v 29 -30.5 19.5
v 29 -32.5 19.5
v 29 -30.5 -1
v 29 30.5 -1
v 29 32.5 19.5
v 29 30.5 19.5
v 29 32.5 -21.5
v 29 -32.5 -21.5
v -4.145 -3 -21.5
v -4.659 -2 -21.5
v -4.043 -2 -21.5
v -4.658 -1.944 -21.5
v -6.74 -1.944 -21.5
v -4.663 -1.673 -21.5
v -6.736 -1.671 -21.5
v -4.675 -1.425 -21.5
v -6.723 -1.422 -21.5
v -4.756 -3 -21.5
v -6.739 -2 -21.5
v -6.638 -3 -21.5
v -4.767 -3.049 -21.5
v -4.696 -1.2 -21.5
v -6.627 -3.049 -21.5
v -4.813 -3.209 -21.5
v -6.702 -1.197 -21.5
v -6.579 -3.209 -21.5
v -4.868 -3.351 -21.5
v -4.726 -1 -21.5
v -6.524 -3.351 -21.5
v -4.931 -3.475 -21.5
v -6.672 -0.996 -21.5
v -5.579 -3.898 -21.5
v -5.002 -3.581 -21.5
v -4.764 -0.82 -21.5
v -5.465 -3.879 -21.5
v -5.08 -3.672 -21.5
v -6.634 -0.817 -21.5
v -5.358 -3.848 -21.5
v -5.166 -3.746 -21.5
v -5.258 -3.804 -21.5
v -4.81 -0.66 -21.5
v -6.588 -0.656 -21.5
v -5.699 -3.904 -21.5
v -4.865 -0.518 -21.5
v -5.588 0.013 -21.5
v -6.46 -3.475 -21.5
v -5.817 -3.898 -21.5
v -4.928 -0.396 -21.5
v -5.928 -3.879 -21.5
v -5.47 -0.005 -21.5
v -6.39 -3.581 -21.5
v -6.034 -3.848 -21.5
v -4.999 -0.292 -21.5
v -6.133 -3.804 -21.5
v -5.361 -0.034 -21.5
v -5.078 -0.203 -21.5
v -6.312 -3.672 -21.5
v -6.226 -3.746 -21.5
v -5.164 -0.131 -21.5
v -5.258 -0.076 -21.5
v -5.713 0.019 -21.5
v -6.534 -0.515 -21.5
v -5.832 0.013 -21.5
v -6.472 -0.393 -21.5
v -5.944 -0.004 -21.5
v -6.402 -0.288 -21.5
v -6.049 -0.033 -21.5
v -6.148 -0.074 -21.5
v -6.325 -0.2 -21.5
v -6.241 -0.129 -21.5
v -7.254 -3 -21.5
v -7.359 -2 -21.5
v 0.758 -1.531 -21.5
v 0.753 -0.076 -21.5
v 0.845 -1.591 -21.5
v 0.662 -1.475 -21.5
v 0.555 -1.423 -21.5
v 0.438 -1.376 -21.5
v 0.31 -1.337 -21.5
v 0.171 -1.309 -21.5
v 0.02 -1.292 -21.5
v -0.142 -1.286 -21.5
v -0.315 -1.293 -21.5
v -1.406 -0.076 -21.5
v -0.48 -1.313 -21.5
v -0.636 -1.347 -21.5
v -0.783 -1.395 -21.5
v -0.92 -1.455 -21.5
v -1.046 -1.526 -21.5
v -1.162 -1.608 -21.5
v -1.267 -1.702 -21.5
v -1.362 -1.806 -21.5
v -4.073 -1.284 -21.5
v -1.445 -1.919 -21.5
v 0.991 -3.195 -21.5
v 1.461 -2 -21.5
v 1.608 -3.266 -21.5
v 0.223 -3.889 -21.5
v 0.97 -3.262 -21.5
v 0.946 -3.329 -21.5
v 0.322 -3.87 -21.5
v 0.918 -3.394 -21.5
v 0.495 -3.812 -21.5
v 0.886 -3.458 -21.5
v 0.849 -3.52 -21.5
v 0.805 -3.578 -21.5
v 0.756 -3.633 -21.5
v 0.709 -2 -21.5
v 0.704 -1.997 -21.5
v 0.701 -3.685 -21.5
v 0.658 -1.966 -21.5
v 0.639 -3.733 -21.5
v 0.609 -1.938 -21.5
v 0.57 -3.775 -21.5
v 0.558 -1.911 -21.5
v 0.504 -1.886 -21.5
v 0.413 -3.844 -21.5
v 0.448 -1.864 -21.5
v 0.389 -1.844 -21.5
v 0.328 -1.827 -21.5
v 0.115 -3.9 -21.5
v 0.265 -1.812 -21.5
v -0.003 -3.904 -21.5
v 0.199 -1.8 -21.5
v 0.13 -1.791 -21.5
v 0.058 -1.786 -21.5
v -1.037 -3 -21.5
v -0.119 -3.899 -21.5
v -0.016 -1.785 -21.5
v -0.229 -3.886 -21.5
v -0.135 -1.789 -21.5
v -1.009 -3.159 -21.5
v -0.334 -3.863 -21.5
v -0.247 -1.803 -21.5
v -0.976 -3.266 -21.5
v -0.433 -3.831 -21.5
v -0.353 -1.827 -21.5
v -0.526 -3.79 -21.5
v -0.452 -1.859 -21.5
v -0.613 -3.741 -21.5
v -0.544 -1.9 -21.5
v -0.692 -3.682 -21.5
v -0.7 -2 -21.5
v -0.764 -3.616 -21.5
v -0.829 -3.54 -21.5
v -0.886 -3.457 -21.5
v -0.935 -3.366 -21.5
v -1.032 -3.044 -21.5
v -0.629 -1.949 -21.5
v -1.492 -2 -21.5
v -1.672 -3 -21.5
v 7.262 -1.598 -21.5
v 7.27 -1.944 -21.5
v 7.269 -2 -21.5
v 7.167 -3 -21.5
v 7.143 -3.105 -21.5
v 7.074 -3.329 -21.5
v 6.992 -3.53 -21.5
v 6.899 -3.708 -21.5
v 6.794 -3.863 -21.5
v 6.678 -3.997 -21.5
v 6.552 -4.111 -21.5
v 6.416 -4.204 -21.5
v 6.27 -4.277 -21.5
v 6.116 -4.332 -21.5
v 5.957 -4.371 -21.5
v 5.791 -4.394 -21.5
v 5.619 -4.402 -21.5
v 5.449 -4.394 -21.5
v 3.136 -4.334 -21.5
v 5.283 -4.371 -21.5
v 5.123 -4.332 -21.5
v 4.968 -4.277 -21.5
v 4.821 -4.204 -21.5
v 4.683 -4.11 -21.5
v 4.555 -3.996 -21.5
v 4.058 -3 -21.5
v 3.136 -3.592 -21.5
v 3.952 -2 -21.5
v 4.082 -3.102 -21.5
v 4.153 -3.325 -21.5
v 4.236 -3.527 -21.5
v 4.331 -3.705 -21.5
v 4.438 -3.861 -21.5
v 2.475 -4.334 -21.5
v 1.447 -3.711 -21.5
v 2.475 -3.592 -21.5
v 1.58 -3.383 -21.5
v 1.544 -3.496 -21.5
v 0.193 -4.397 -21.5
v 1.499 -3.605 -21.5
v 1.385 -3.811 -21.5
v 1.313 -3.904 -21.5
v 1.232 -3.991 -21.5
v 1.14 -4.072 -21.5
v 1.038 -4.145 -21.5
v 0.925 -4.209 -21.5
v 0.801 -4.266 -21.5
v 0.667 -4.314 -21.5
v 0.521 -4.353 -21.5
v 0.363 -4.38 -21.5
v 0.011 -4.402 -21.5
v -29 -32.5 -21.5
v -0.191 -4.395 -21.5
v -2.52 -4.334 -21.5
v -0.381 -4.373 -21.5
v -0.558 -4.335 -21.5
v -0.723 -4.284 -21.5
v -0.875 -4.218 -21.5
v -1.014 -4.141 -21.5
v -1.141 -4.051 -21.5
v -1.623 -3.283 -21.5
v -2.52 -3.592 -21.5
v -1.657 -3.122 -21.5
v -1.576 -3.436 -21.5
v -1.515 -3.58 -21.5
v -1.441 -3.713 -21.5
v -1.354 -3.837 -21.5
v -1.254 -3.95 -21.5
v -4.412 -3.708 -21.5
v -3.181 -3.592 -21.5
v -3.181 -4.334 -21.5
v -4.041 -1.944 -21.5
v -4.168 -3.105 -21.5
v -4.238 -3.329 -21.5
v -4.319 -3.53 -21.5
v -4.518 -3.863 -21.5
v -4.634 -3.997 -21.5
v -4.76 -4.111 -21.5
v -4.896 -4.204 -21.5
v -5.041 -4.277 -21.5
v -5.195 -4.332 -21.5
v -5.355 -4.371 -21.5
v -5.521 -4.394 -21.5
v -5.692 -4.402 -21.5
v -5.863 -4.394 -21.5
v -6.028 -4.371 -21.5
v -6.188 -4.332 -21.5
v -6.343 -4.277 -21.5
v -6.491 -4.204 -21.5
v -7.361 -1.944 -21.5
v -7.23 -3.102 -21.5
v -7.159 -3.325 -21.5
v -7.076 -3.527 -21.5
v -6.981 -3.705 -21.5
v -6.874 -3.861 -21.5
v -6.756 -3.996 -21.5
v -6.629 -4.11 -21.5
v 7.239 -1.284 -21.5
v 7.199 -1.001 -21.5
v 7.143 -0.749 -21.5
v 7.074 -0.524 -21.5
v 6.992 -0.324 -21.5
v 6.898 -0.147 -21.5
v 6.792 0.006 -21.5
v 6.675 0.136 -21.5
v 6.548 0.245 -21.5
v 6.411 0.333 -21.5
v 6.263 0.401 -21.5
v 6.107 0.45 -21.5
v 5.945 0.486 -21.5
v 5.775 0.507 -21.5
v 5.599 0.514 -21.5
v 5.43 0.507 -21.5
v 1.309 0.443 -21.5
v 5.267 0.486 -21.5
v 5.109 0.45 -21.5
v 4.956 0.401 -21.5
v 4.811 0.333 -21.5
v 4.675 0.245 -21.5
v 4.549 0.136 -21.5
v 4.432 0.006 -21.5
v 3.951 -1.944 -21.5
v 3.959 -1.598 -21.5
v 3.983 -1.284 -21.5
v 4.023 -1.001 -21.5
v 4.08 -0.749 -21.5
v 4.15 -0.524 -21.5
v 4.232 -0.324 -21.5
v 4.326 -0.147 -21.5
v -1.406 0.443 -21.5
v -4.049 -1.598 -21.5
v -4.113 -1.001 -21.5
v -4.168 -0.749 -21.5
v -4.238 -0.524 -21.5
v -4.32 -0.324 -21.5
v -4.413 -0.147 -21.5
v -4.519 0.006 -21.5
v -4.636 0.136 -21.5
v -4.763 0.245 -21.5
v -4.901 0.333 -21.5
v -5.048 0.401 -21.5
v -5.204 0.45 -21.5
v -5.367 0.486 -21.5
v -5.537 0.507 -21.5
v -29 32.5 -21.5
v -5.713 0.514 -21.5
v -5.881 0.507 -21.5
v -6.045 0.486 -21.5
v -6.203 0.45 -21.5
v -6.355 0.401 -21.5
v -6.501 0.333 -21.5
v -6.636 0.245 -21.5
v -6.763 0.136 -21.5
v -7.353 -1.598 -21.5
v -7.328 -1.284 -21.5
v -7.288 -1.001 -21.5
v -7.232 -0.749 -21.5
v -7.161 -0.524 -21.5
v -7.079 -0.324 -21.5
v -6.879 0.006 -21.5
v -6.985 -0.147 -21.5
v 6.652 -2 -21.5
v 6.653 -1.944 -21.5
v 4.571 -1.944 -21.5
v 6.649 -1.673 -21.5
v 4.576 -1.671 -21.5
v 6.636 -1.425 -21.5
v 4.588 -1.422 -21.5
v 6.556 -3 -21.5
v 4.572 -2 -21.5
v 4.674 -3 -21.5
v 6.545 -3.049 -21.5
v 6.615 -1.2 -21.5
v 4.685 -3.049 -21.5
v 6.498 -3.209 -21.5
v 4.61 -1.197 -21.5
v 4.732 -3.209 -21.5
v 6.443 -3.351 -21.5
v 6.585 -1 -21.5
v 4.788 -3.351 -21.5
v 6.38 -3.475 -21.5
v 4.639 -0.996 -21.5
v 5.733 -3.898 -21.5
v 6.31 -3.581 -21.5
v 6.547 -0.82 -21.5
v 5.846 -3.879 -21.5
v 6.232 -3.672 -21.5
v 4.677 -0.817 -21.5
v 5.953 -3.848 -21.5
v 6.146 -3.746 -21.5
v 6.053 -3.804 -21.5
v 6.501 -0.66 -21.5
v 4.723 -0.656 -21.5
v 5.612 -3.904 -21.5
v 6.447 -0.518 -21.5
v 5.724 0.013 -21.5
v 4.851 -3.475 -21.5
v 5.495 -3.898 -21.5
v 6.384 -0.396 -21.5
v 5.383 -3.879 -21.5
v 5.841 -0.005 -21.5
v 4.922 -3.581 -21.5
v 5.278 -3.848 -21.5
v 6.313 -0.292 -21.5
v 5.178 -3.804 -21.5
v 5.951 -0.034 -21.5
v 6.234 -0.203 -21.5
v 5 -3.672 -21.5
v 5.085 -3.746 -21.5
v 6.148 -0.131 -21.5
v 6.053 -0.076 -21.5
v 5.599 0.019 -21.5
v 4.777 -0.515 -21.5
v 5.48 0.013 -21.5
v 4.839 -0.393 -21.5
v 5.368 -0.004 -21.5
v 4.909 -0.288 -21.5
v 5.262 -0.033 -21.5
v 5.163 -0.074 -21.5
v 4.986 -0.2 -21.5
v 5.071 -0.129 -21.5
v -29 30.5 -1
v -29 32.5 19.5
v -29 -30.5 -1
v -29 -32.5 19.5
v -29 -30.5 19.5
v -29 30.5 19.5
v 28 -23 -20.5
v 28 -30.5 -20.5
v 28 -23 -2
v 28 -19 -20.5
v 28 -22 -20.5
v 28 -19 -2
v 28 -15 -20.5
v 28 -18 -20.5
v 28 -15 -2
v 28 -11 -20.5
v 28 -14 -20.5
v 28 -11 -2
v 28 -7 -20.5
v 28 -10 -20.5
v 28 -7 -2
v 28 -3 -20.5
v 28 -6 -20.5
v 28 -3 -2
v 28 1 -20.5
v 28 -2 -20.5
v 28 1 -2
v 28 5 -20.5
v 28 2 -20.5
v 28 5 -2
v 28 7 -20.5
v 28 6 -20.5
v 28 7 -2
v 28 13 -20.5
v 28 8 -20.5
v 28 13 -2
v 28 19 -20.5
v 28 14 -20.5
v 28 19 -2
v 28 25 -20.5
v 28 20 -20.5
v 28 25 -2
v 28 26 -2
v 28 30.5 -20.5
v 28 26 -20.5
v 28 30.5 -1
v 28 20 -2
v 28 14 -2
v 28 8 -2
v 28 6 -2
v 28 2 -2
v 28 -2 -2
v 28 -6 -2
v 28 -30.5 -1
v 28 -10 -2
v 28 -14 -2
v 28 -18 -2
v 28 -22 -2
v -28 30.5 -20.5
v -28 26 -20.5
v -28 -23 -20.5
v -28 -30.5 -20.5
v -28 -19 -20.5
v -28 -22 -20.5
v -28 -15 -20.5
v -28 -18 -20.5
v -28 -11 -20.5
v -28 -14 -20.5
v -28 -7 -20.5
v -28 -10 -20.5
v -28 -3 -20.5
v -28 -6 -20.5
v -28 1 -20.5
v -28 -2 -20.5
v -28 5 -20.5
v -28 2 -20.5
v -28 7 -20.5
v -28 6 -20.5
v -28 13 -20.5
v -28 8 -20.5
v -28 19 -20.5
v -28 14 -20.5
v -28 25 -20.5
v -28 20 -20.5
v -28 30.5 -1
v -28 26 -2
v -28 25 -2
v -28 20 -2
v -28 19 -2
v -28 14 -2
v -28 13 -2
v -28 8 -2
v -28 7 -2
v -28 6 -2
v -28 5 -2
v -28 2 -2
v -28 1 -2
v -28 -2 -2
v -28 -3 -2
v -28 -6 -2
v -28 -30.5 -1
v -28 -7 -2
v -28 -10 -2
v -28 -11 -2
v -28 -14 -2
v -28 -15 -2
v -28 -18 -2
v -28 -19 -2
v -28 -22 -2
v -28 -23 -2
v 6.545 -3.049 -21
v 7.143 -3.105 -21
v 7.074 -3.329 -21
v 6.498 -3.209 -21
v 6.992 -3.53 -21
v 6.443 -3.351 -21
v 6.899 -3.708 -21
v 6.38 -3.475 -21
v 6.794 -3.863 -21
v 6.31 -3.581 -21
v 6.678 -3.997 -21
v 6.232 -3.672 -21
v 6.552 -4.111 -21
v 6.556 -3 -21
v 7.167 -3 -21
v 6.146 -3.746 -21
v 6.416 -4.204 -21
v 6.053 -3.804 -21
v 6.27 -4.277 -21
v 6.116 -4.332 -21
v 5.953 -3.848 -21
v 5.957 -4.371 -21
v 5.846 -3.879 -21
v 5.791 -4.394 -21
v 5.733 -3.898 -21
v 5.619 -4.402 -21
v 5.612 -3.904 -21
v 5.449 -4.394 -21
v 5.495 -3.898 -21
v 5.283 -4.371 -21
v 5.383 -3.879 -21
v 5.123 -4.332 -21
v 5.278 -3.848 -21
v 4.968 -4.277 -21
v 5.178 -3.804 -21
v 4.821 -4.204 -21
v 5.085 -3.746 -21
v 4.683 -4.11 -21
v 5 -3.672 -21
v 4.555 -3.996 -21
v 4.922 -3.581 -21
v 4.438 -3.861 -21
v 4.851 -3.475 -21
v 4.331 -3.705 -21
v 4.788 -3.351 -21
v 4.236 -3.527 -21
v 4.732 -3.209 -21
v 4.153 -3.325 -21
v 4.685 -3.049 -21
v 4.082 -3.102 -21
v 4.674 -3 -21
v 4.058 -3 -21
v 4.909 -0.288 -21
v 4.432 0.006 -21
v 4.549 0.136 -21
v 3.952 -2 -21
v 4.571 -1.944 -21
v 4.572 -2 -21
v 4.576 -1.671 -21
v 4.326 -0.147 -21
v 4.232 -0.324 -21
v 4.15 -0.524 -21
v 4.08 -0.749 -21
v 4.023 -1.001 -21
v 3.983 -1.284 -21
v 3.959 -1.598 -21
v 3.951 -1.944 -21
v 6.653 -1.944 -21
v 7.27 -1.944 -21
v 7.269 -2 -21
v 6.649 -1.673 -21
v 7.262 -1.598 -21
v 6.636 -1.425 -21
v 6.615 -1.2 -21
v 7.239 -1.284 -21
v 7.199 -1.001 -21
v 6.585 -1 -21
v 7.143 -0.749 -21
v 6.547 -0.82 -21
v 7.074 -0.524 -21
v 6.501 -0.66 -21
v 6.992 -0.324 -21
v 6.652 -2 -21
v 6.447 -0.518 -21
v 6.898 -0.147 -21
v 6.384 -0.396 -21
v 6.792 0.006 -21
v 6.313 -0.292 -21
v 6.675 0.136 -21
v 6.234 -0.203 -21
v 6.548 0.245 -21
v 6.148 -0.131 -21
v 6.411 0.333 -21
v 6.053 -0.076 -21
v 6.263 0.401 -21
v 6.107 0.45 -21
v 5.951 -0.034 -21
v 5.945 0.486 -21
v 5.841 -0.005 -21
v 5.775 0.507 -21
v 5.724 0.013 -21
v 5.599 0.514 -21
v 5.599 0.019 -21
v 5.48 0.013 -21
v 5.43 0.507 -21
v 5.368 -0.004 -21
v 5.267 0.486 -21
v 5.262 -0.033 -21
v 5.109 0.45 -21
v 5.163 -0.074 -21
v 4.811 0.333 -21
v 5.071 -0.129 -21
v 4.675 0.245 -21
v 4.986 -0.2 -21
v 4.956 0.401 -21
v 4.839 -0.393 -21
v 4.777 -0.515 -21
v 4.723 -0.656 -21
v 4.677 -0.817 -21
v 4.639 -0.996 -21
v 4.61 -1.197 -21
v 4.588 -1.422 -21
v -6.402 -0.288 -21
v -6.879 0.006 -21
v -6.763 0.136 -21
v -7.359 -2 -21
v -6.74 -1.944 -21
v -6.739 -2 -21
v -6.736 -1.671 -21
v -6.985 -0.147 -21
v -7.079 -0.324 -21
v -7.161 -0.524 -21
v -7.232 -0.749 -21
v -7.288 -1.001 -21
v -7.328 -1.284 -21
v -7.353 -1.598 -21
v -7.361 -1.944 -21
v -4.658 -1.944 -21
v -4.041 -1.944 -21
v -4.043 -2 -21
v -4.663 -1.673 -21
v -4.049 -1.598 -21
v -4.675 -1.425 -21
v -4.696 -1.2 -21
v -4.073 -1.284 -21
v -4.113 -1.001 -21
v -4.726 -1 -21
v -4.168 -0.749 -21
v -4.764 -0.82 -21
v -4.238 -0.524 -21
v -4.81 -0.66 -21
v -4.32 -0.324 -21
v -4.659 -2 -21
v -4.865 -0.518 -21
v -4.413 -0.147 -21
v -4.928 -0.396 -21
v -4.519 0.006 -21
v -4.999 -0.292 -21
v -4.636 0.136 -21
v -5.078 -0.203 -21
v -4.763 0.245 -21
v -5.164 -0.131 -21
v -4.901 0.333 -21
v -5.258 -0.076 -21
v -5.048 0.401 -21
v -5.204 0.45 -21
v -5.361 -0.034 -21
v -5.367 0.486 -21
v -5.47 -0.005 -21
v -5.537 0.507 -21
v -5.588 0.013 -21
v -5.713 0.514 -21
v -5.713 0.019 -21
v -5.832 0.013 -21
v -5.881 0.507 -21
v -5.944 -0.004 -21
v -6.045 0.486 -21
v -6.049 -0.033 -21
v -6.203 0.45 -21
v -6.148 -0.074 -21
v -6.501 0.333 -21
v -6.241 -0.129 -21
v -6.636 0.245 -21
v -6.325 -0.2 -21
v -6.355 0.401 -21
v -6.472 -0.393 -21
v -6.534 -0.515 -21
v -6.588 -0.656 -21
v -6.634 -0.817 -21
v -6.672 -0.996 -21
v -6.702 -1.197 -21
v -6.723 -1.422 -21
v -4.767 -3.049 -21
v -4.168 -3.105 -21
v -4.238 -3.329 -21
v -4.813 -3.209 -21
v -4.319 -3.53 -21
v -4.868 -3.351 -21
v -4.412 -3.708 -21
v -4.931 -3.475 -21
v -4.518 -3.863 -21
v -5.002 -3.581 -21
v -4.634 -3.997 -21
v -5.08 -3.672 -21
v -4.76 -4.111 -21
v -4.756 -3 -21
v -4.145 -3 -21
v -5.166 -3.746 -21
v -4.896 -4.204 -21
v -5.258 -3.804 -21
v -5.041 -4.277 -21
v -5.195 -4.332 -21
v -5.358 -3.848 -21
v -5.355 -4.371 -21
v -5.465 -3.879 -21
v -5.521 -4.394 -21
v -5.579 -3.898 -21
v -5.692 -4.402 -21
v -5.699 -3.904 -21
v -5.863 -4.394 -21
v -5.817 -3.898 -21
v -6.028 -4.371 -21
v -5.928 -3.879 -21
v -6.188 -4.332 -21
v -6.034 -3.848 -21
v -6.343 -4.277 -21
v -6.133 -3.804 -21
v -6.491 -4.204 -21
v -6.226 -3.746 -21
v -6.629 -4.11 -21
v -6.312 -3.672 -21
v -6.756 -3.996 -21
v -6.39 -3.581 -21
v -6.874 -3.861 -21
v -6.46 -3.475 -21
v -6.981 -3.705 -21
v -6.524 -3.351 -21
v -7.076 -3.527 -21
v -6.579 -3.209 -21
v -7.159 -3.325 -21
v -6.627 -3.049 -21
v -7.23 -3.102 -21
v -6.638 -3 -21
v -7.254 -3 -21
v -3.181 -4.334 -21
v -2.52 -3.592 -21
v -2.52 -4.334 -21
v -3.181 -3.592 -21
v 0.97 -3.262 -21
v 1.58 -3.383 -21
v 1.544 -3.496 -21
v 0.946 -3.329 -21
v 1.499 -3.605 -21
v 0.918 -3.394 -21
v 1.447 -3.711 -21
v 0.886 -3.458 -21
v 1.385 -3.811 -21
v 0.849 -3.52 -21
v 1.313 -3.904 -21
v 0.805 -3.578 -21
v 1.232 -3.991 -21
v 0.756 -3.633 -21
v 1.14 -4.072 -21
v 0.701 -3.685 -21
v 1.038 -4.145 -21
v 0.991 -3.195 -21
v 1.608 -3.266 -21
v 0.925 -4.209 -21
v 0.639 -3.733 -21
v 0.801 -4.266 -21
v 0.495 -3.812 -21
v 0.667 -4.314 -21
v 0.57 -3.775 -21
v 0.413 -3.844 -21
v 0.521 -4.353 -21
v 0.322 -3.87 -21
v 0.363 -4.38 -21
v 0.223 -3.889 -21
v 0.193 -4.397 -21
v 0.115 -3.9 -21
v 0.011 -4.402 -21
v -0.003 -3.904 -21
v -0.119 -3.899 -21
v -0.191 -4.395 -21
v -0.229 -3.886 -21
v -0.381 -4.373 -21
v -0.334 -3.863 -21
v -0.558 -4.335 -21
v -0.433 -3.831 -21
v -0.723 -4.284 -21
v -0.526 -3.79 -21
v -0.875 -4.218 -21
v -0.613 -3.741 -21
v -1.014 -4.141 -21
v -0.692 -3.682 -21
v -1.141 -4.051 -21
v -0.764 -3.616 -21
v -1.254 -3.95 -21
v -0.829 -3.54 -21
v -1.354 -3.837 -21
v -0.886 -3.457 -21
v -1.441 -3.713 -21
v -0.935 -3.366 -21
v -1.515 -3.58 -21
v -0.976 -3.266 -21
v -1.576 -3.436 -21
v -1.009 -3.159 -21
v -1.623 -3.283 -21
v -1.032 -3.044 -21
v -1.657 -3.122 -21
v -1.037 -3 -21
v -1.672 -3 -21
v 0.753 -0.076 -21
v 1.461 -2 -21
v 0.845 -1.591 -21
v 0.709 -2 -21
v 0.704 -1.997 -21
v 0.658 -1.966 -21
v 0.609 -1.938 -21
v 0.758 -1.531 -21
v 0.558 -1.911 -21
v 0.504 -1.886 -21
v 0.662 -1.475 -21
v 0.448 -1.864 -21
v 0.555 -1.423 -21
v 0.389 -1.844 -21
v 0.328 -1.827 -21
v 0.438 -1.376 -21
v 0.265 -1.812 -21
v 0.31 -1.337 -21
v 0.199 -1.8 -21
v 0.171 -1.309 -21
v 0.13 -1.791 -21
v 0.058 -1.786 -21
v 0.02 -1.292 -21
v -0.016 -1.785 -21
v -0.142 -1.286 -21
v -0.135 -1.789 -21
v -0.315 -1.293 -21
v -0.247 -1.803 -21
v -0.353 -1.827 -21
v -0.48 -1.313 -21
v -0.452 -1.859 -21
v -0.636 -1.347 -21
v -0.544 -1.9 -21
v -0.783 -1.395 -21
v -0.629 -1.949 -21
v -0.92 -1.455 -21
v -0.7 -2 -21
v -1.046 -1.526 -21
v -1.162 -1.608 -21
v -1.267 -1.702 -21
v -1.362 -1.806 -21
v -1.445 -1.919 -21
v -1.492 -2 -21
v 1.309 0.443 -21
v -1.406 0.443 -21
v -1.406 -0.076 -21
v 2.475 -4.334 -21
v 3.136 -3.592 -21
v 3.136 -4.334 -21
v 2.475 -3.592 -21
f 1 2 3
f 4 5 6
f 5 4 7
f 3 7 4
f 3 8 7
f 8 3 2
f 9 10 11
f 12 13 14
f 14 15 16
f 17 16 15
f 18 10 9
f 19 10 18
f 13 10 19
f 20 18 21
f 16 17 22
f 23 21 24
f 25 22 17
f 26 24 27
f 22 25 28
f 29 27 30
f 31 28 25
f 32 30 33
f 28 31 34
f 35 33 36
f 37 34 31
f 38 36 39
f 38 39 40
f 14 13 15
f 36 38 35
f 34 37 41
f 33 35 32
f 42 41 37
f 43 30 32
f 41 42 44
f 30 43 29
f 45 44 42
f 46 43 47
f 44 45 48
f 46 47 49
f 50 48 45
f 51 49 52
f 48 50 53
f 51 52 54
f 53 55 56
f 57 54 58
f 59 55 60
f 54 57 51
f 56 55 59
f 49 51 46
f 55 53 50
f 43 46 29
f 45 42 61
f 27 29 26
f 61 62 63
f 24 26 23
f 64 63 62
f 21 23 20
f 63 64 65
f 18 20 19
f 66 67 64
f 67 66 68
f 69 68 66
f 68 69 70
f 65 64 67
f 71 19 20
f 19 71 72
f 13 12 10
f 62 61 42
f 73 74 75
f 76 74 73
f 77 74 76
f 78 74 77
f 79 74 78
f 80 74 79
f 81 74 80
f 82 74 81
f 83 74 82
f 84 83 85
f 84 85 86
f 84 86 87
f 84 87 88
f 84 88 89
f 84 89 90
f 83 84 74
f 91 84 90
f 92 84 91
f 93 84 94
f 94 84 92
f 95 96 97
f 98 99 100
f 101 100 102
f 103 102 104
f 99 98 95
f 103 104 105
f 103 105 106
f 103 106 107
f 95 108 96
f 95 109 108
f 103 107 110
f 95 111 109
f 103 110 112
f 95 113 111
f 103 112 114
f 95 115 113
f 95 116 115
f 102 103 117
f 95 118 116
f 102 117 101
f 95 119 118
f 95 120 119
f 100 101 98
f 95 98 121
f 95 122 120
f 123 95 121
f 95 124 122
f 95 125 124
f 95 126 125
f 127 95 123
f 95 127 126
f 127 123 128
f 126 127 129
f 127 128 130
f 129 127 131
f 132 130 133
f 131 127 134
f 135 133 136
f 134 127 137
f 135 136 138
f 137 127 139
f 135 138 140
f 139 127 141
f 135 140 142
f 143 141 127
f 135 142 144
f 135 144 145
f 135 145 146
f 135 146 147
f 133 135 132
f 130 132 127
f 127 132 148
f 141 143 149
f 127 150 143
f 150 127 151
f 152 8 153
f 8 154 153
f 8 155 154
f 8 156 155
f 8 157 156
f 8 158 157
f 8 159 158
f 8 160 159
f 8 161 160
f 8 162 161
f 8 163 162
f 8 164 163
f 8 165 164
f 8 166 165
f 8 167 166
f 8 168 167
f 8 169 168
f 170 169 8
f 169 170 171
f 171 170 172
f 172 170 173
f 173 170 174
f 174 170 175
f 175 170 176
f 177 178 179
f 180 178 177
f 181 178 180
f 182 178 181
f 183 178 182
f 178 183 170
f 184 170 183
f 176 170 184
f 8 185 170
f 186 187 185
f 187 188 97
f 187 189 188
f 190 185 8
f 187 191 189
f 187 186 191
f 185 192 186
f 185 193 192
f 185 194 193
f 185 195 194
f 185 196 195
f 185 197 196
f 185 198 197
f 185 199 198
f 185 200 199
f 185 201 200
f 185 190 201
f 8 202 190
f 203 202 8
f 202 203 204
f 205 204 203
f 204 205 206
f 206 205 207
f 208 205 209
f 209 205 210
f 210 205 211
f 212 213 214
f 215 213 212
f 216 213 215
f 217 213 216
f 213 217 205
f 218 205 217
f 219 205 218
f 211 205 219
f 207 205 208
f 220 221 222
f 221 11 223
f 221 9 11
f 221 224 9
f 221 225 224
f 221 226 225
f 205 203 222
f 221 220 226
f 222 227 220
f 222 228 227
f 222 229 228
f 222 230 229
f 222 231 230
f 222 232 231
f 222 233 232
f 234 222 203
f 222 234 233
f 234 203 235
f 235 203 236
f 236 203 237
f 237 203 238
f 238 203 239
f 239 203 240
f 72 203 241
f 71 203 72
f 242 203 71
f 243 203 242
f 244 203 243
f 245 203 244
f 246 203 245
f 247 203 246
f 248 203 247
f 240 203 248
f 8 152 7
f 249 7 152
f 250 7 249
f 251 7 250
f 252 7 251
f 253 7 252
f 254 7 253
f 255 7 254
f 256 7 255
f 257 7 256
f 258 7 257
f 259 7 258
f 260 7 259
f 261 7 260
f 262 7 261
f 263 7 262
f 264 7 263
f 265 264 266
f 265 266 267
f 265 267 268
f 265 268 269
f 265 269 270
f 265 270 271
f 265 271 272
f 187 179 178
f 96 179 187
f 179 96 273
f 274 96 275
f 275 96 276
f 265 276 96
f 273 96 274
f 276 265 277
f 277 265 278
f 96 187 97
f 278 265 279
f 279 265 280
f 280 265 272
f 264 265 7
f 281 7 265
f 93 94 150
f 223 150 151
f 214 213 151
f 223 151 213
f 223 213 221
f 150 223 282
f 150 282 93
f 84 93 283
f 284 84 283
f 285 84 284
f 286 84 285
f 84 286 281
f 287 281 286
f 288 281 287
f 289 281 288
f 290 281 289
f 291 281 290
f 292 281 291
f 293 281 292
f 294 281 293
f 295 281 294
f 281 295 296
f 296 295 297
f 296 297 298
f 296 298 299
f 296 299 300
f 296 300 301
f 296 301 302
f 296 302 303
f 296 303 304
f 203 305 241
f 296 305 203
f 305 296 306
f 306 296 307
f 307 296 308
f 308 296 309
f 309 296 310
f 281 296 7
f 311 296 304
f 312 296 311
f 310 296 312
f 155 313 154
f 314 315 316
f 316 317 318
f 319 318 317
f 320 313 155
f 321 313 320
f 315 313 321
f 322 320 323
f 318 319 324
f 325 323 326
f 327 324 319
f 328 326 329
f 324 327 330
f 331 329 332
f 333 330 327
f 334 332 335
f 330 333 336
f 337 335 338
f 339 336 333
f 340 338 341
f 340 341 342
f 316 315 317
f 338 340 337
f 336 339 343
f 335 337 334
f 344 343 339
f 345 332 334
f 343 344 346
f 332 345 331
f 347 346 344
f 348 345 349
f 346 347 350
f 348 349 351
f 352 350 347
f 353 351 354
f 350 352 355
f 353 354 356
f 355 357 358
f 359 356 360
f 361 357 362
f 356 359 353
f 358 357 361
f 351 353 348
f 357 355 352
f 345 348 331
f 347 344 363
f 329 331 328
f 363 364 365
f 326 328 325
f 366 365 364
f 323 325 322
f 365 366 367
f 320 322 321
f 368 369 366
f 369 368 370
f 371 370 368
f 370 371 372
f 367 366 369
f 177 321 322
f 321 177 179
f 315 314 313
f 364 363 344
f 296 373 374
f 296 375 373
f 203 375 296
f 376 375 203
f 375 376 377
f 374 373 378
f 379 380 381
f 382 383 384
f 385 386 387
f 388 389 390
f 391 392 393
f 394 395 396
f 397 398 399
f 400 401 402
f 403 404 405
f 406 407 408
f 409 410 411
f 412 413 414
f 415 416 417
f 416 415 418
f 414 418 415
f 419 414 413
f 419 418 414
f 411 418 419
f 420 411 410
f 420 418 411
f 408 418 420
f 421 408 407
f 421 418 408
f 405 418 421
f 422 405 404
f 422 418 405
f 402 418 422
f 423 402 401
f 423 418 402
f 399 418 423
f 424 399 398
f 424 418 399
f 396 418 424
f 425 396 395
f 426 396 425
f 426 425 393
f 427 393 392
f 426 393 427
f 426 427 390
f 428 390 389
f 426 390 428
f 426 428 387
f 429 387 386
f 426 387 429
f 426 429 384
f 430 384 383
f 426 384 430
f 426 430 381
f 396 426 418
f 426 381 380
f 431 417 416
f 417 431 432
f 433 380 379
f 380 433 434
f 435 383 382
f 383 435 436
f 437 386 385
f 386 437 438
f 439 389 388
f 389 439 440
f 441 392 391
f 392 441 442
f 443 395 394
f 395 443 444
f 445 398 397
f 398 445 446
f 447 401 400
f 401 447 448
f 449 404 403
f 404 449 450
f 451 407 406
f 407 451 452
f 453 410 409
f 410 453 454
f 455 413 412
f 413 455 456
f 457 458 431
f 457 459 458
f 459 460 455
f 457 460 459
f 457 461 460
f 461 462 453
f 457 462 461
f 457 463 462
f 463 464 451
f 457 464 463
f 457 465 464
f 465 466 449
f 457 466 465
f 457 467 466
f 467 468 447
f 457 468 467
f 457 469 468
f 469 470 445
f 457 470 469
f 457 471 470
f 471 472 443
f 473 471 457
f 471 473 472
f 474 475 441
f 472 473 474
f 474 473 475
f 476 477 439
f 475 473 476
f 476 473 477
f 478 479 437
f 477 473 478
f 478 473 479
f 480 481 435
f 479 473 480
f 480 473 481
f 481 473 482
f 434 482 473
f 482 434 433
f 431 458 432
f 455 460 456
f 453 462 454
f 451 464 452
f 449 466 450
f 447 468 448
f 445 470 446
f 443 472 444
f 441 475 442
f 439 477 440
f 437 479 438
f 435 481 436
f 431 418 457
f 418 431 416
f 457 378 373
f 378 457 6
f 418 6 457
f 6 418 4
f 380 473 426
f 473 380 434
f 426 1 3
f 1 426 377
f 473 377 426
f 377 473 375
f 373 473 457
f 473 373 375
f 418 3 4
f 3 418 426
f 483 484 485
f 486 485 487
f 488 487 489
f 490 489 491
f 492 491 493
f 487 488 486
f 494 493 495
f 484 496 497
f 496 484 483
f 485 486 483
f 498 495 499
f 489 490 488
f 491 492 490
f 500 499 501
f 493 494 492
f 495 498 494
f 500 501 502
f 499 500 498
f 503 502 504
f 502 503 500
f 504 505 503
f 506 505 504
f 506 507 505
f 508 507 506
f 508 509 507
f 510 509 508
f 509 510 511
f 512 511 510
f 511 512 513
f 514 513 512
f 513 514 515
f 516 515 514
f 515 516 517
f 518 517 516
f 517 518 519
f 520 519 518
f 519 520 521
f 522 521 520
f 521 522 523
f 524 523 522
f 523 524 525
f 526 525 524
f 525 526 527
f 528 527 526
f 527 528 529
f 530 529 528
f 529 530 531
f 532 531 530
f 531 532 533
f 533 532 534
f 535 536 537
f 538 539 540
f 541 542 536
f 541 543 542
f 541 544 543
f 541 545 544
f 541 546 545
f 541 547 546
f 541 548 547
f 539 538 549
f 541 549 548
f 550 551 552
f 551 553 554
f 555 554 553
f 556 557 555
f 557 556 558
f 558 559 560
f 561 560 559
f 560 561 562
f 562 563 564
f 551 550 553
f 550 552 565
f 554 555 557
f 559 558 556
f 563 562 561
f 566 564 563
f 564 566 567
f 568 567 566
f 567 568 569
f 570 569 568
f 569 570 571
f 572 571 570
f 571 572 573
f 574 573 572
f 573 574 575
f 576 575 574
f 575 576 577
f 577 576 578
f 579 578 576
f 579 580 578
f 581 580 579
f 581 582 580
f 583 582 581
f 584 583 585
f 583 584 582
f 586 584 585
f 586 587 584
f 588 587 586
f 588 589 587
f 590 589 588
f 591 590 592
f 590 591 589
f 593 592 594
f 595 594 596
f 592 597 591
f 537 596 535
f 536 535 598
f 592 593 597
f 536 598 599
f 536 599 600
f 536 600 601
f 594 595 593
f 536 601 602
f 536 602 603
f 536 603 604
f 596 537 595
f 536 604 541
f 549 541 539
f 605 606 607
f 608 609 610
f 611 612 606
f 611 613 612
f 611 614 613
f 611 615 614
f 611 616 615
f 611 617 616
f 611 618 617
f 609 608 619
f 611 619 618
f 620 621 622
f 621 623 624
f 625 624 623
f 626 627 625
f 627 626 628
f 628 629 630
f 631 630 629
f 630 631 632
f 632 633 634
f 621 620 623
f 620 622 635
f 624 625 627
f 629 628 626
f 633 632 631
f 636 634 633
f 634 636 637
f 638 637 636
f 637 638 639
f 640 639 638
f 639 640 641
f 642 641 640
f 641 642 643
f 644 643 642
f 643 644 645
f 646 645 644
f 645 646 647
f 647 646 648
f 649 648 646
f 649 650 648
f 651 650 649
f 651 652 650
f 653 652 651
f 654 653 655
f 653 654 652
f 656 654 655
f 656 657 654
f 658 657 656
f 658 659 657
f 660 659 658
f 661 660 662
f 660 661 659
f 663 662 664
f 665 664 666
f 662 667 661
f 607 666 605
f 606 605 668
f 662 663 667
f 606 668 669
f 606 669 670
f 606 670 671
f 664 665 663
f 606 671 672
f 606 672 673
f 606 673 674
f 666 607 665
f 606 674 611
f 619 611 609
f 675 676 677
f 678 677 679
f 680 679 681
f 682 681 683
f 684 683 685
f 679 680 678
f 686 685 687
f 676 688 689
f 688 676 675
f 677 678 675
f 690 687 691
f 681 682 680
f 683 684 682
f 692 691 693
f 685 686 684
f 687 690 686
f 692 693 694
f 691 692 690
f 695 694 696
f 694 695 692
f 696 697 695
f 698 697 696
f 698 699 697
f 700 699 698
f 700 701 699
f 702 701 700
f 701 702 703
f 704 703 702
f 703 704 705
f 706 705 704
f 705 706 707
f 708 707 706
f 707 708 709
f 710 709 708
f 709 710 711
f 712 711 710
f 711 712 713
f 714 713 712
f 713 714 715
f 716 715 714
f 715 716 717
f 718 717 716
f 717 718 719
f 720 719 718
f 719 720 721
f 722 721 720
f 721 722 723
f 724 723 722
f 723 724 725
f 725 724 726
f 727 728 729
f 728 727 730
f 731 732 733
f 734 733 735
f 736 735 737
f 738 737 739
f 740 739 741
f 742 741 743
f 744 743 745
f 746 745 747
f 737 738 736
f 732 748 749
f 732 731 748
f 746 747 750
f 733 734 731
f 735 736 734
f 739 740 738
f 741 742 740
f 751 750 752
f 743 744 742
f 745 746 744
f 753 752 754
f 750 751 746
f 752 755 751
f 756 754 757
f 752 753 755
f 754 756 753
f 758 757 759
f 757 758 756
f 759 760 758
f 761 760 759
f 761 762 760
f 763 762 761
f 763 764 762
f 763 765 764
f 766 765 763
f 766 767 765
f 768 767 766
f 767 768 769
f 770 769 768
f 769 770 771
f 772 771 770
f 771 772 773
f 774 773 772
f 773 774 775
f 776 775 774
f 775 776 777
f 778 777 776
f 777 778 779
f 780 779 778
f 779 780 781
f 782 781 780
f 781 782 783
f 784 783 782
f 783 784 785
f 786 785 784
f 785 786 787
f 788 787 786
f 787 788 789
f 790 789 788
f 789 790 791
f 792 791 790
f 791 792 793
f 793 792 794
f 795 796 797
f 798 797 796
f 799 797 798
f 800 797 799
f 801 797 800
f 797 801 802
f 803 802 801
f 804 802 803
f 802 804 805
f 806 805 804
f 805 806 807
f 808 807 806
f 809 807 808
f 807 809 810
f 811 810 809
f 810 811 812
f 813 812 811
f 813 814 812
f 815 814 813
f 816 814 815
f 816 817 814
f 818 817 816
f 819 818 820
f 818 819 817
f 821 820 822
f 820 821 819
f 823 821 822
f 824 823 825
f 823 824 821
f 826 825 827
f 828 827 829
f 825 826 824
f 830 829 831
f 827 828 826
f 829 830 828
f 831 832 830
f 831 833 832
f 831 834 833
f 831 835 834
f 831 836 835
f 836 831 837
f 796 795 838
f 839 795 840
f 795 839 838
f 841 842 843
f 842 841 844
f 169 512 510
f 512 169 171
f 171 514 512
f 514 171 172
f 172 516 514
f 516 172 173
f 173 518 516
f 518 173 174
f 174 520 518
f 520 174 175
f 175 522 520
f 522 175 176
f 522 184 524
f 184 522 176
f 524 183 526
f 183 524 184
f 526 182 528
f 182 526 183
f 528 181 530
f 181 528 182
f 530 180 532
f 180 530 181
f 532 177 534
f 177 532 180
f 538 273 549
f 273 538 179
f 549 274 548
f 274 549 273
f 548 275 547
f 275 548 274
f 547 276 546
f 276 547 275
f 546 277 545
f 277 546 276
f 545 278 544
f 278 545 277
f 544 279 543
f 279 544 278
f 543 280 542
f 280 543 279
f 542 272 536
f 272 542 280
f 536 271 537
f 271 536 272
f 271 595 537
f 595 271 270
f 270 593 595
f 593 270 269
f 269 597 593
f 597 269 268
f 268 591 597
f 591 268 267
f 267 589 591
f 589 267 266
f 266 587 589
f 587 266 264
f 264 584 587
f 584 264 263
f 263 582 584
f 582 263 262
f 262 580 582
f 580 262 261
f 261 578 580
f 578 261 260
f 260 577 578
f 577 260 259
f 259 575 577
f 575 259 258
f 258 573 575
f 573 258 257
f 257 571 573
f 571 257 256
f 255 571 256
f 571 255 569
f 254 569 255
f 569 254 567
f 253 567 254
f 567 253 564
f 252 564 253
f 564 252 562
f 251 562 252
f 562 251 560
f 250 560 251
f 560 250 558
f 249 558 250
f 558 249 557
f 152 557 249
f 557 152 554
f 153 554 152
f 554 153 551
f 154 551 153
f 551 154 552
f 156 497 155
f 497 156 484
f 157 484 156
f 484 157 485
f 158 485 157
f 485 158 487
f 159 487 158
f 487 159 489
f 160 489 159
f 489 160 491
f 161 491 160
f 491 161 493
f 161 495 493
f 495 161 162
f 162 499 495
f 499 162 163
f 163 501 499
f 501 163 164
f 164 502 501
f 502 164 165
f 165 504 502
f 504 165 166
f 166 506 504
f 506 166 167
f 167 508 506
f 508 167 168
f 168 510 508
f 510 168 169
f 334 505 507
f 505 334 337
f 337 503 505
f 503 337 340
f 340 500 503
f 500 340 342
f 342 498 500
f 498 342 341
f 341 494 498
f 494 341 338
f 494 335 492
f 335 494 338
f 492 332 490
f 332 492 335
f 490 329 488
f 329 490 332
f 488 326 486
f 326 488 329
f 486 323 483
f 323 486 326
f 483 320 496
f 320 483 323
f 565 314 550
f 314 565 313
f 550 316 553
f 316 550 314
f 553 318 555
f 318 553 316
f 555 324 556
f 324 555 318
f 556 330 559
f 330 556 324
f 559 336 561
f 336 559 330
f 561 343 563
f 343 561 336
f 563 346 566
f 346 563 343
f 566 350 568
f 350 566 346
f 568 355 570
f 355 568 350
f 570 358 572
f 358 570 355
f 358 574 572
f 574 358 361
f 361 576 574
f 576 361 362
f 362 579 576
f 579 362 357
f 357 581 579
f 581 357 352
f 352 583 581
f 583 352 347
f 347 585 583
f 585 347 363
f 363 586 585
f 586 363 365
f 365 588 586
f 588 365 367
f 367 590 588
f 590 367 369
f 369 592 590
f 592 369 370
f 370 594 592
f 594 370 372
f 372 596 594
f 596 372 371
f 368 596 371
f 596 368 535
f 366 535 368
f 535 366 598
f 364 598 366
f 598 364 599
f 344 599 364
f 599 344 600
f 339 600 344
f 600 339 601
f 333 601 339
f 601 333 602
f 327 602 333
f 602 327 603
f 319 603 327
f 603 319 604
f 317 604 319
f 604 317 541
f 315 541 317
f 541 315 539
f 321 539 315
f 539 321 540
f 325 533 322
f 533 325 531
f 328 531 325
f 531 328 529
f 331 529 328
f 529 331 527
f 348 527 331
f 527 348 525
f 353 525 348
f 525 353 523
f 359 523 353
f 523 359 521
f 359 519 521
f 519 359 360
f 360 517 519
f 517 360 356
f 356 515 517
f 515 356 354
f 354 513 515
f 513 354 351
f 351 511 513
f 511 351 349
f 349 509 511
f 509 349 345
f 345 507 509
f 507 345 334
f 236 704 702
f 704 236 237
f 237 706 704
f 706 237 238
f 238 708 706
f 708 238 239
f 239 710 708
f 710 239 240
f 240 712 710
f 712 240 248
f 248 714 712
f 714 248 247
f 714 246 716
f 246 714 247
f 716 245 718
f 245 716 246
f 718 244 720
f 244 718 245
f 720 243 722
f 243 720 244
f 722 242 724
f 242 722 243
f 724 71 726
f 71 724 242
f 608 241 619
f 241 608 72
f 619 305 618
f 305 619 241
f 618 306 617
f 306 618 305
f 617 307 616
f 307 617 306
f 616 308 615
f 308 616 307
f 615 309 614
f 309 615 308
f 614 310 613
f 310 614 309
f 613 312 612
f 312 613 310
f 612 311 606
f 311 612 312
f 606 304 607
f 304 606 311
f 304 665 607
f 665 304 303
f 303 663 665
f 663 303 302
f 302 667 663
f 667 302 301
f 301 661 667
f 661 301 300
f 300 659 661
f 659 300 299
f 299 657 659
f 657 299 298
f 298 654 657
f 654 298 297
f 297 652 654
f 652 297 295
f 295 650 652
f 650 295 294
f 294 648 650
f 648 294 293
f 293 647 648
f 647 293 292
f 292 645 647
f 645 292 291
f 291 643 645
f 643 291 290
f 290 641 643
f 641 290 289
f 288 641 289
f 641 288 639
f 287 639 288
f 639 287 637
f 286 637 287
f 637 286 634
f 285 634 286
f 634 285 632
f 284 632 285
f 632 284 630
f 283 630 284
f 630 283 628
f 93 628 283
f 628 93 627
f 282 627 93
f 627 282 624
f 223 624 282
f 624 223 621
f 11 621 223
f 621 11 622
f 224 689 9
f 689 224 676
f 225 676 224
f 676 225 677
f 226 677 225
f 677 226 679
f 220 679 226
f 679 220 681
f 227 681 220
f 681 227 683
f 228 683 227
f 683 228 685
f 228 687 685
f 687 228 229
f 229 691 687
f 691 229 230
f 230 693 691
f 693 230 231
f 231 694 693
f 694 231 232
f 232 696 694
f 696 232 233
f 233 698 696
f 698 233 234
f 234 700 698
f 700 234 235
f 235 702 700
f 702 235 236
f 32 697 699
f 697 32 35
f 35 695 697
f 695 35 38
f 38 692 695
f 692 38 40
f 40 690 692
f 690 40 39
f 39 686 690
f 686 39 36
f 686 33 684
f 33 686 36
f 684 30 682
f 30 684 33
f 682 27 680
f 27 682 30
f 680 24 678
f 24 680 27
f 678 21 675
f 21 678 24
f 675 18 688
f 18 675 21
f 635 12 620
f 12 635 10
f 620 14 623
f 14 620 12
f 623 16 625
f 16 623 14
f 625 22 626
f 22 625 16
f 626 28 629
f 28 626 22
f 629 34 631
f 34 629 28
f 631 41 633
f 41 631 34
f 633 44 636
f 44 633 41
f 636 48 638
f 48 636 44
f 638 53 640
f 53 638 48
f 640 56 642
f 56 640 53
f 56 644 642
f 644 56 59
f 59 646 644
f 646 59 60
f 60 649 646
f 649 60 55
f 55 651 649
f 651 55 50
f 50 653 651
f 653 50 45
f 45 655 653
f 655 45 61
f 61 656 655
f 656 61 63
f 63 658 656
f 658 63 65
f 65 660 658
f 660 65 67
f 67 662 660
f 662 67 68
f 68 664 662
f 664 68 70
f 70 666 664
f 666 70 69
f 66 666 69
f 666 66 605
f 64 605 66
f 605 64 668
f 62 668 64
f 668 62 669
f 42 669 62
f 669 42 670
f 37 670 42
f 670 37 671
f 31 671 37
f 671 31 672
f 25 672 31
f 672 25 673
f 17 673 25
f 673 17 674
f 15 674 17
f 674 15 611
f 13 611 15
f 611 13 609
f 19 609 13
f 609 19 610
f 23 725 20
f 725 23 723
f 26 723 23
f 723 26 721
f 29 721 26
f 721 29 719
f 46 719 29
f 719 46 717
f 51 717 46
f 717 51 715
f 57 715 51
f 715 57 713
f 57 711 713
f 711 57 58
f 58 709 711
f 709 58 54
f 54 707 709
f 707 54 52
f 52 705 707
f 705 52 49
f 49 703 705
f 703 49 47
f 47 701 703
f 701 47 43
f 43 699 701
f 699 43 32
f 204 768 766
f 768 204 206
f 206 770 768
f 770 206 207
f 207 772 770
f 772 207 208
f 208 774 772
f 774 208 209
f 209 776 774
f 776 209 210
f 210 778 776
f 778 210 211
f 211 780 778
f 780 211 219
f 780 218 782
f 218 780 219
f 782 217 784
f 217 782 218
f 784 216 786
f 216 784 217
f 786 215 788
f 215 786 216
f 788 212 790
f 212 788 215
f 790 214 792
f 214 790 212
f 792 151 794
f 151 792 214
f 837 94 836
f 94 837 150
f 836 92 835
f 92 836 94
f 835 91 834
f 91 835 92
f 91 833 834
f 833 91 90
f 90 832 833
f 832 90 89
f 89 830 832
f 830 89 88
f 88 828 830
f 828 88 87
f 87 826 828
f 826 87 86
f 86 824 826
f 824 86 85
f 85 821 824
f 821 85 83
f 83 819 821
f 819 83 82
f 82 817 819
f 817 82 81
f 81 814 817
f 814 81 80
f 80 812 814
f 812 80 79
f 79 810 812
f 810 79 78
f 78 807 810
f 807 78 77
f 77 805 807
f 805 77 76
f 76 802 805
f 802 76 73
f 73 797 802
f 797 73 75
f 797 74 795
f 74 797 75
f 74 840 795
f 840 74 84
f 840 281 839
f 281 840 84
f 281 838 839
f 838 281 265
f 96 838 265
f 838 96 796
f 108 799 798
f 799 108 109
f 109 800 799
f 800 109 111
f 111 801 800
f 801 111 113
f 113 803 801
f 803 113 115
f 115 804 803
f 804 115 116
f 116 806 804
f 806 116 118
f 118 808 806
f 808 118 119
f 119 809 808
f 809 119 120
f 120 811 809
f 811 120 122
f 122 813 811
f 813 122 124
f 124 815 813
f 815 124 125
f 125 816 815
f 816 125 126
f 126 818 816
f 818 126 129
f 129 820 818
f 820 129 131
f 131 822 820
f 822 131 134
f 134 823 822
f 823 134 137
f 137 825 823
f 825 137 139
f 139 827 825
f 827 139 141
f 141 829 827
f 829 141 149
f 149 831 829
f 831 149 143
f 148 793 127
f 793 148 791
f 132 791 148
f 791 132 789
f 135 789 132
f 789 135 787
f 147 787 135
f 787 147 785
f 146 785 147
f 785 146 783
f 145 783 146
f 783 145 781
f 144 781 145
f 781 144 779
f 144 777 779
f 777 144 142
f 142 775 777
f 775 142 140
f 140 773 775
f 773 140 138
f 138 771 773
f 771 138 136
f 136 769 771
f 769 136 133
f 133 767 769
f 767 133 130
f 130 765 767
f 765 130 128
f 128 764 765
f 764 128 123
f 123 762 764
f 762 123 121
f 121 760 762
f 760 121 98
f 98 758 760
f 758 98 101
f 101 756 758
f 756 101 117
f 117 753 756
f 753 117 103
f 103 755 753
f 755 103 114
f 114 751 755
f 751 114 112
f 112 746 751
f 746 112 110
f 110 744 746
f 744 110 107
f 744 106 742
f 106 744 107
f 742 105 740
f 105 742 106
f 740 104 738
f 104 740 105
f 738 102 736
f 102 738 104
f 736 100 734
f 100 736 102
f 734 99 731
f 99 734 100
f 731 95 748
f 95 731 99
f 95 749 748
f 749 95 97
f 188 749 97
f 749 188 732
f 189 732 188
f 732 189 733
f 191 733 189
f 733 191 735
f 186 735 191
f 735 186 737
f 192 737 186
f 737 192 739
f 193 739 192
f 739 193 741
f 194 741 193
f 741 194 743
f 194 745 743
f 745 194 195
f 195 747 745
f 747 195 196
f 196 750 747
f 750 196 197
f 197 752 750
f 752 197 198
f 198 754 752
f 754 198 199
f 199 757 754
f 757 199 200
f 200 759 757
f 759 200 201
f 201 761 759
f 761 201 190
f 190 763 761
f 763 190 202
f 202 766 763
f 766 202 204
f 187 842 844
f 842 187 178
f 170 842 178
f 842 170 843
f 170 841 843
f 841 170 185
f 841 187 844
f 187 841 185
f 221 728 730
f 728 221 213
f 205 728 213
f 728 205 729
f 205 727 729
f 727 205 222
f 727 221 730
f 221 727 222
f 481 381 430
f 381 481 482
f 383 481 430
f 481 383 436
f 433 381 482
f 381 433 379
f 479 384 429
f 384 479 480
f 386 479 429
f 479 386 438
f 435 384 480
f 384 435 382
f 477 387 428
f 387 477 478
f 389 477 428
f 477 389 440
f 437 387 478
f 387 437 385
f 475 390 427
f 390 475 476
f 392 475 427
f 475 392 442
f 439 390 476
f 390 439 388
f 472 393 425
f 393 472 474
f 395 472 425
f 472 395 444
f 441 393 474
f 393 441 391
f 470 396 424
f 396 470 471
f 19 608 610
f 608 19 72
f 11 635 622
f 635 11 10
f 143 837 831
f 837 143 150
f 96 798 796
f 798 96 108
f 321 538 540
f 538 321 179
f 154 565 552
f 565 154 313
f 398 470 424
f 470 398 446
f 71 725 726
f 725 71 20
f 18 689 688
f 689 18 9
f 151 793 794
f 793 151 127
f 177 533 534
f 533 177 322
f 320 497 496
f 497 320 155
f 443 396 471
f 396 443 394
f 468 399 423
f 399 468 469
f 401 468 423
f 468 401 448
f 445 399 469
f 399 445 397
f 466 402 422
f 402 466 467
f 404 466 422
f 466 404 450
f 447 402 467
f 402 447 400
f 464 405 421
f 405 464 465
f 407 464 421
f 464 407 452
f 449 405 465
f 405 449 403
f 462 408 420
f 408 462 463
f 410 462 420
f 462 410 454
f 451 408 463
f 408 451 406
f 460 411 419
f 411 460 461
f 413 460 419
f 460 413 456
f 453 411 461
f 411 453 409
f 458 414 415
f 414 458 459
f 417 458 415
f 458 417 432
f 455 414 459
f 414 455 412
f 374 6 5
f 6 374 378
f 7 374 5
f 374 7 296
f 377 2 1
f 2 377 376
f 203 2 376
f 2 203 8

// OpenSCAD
// 1 unit = 1/16"

version = "0.5.0";

function toUnits(inches, sixteenths) = (inches * 16) + sixteenths;

slots = [7,3,3,3,3,3,3,3,1,5,5,5,5];
cardWidth = toUnits(2, 8);
cardLength = toUnits(3, 7);

channelWidth = cardLength + 1;
channelHeight = cardWidth + 1;
channelLength = 61 ;

trayWidth = channelWidth + 2;
trayHeight = channelHeight + 2;
trayLength = channelLength + 2;

ribHeigh = (trayHeight / 2) - 2;

endcapHeight = cardWidth + 1;
endcapThickness = 2;



module rib() {
    translate ([0, 0, -(ribHeigh) / 2]) cube ([trayWidth,1, ribHeigh], true);
}

module endCap() {
    cube ([trayWidth, endcapThickness, endcapHeight], true);
}

%cube([cardLength, 0.5, cardWidth], true); // sample card

// recursive sum function on an array
// v = vector
// i = current index
// e = end index
// r = return value
function sum(v, i=0, e=0, r=0) = i<=e ? sum(v, i+1, e, r+v[i]) : r;

module layoutRibs() {
    for (i = [0: len(slots) - 1] ) {
        y = sum(slots, 0, i);
        translate ([0, - (channelLength / 2) + 1,-1]) translate ([0,y + i,-1]) rib();
    };
}

difference() {
    cube ([trayWidth, trayLength, trayHeight], true);
    cube ([channelWidth, channelLength, channelHeight], true);
    translate ([0, 0, trayHeight / 2 ]) cube ([trayWidth + 2, trayLength+ 2, trayHeight+2], true);
    translate ([0, -2, - ribHeigh - 1.5])
        rotate ([0,180,0])
            linear_extrude (2) {
                scale (.5, .5, .5)
                text(version, halign = "center", valign = "center");
            } ;
};



translate ([0, trayLength / 2, -1] ) endCap();
translate ([0, -(trayLength / 2), -1] ) endCap();



layoutRibs();
